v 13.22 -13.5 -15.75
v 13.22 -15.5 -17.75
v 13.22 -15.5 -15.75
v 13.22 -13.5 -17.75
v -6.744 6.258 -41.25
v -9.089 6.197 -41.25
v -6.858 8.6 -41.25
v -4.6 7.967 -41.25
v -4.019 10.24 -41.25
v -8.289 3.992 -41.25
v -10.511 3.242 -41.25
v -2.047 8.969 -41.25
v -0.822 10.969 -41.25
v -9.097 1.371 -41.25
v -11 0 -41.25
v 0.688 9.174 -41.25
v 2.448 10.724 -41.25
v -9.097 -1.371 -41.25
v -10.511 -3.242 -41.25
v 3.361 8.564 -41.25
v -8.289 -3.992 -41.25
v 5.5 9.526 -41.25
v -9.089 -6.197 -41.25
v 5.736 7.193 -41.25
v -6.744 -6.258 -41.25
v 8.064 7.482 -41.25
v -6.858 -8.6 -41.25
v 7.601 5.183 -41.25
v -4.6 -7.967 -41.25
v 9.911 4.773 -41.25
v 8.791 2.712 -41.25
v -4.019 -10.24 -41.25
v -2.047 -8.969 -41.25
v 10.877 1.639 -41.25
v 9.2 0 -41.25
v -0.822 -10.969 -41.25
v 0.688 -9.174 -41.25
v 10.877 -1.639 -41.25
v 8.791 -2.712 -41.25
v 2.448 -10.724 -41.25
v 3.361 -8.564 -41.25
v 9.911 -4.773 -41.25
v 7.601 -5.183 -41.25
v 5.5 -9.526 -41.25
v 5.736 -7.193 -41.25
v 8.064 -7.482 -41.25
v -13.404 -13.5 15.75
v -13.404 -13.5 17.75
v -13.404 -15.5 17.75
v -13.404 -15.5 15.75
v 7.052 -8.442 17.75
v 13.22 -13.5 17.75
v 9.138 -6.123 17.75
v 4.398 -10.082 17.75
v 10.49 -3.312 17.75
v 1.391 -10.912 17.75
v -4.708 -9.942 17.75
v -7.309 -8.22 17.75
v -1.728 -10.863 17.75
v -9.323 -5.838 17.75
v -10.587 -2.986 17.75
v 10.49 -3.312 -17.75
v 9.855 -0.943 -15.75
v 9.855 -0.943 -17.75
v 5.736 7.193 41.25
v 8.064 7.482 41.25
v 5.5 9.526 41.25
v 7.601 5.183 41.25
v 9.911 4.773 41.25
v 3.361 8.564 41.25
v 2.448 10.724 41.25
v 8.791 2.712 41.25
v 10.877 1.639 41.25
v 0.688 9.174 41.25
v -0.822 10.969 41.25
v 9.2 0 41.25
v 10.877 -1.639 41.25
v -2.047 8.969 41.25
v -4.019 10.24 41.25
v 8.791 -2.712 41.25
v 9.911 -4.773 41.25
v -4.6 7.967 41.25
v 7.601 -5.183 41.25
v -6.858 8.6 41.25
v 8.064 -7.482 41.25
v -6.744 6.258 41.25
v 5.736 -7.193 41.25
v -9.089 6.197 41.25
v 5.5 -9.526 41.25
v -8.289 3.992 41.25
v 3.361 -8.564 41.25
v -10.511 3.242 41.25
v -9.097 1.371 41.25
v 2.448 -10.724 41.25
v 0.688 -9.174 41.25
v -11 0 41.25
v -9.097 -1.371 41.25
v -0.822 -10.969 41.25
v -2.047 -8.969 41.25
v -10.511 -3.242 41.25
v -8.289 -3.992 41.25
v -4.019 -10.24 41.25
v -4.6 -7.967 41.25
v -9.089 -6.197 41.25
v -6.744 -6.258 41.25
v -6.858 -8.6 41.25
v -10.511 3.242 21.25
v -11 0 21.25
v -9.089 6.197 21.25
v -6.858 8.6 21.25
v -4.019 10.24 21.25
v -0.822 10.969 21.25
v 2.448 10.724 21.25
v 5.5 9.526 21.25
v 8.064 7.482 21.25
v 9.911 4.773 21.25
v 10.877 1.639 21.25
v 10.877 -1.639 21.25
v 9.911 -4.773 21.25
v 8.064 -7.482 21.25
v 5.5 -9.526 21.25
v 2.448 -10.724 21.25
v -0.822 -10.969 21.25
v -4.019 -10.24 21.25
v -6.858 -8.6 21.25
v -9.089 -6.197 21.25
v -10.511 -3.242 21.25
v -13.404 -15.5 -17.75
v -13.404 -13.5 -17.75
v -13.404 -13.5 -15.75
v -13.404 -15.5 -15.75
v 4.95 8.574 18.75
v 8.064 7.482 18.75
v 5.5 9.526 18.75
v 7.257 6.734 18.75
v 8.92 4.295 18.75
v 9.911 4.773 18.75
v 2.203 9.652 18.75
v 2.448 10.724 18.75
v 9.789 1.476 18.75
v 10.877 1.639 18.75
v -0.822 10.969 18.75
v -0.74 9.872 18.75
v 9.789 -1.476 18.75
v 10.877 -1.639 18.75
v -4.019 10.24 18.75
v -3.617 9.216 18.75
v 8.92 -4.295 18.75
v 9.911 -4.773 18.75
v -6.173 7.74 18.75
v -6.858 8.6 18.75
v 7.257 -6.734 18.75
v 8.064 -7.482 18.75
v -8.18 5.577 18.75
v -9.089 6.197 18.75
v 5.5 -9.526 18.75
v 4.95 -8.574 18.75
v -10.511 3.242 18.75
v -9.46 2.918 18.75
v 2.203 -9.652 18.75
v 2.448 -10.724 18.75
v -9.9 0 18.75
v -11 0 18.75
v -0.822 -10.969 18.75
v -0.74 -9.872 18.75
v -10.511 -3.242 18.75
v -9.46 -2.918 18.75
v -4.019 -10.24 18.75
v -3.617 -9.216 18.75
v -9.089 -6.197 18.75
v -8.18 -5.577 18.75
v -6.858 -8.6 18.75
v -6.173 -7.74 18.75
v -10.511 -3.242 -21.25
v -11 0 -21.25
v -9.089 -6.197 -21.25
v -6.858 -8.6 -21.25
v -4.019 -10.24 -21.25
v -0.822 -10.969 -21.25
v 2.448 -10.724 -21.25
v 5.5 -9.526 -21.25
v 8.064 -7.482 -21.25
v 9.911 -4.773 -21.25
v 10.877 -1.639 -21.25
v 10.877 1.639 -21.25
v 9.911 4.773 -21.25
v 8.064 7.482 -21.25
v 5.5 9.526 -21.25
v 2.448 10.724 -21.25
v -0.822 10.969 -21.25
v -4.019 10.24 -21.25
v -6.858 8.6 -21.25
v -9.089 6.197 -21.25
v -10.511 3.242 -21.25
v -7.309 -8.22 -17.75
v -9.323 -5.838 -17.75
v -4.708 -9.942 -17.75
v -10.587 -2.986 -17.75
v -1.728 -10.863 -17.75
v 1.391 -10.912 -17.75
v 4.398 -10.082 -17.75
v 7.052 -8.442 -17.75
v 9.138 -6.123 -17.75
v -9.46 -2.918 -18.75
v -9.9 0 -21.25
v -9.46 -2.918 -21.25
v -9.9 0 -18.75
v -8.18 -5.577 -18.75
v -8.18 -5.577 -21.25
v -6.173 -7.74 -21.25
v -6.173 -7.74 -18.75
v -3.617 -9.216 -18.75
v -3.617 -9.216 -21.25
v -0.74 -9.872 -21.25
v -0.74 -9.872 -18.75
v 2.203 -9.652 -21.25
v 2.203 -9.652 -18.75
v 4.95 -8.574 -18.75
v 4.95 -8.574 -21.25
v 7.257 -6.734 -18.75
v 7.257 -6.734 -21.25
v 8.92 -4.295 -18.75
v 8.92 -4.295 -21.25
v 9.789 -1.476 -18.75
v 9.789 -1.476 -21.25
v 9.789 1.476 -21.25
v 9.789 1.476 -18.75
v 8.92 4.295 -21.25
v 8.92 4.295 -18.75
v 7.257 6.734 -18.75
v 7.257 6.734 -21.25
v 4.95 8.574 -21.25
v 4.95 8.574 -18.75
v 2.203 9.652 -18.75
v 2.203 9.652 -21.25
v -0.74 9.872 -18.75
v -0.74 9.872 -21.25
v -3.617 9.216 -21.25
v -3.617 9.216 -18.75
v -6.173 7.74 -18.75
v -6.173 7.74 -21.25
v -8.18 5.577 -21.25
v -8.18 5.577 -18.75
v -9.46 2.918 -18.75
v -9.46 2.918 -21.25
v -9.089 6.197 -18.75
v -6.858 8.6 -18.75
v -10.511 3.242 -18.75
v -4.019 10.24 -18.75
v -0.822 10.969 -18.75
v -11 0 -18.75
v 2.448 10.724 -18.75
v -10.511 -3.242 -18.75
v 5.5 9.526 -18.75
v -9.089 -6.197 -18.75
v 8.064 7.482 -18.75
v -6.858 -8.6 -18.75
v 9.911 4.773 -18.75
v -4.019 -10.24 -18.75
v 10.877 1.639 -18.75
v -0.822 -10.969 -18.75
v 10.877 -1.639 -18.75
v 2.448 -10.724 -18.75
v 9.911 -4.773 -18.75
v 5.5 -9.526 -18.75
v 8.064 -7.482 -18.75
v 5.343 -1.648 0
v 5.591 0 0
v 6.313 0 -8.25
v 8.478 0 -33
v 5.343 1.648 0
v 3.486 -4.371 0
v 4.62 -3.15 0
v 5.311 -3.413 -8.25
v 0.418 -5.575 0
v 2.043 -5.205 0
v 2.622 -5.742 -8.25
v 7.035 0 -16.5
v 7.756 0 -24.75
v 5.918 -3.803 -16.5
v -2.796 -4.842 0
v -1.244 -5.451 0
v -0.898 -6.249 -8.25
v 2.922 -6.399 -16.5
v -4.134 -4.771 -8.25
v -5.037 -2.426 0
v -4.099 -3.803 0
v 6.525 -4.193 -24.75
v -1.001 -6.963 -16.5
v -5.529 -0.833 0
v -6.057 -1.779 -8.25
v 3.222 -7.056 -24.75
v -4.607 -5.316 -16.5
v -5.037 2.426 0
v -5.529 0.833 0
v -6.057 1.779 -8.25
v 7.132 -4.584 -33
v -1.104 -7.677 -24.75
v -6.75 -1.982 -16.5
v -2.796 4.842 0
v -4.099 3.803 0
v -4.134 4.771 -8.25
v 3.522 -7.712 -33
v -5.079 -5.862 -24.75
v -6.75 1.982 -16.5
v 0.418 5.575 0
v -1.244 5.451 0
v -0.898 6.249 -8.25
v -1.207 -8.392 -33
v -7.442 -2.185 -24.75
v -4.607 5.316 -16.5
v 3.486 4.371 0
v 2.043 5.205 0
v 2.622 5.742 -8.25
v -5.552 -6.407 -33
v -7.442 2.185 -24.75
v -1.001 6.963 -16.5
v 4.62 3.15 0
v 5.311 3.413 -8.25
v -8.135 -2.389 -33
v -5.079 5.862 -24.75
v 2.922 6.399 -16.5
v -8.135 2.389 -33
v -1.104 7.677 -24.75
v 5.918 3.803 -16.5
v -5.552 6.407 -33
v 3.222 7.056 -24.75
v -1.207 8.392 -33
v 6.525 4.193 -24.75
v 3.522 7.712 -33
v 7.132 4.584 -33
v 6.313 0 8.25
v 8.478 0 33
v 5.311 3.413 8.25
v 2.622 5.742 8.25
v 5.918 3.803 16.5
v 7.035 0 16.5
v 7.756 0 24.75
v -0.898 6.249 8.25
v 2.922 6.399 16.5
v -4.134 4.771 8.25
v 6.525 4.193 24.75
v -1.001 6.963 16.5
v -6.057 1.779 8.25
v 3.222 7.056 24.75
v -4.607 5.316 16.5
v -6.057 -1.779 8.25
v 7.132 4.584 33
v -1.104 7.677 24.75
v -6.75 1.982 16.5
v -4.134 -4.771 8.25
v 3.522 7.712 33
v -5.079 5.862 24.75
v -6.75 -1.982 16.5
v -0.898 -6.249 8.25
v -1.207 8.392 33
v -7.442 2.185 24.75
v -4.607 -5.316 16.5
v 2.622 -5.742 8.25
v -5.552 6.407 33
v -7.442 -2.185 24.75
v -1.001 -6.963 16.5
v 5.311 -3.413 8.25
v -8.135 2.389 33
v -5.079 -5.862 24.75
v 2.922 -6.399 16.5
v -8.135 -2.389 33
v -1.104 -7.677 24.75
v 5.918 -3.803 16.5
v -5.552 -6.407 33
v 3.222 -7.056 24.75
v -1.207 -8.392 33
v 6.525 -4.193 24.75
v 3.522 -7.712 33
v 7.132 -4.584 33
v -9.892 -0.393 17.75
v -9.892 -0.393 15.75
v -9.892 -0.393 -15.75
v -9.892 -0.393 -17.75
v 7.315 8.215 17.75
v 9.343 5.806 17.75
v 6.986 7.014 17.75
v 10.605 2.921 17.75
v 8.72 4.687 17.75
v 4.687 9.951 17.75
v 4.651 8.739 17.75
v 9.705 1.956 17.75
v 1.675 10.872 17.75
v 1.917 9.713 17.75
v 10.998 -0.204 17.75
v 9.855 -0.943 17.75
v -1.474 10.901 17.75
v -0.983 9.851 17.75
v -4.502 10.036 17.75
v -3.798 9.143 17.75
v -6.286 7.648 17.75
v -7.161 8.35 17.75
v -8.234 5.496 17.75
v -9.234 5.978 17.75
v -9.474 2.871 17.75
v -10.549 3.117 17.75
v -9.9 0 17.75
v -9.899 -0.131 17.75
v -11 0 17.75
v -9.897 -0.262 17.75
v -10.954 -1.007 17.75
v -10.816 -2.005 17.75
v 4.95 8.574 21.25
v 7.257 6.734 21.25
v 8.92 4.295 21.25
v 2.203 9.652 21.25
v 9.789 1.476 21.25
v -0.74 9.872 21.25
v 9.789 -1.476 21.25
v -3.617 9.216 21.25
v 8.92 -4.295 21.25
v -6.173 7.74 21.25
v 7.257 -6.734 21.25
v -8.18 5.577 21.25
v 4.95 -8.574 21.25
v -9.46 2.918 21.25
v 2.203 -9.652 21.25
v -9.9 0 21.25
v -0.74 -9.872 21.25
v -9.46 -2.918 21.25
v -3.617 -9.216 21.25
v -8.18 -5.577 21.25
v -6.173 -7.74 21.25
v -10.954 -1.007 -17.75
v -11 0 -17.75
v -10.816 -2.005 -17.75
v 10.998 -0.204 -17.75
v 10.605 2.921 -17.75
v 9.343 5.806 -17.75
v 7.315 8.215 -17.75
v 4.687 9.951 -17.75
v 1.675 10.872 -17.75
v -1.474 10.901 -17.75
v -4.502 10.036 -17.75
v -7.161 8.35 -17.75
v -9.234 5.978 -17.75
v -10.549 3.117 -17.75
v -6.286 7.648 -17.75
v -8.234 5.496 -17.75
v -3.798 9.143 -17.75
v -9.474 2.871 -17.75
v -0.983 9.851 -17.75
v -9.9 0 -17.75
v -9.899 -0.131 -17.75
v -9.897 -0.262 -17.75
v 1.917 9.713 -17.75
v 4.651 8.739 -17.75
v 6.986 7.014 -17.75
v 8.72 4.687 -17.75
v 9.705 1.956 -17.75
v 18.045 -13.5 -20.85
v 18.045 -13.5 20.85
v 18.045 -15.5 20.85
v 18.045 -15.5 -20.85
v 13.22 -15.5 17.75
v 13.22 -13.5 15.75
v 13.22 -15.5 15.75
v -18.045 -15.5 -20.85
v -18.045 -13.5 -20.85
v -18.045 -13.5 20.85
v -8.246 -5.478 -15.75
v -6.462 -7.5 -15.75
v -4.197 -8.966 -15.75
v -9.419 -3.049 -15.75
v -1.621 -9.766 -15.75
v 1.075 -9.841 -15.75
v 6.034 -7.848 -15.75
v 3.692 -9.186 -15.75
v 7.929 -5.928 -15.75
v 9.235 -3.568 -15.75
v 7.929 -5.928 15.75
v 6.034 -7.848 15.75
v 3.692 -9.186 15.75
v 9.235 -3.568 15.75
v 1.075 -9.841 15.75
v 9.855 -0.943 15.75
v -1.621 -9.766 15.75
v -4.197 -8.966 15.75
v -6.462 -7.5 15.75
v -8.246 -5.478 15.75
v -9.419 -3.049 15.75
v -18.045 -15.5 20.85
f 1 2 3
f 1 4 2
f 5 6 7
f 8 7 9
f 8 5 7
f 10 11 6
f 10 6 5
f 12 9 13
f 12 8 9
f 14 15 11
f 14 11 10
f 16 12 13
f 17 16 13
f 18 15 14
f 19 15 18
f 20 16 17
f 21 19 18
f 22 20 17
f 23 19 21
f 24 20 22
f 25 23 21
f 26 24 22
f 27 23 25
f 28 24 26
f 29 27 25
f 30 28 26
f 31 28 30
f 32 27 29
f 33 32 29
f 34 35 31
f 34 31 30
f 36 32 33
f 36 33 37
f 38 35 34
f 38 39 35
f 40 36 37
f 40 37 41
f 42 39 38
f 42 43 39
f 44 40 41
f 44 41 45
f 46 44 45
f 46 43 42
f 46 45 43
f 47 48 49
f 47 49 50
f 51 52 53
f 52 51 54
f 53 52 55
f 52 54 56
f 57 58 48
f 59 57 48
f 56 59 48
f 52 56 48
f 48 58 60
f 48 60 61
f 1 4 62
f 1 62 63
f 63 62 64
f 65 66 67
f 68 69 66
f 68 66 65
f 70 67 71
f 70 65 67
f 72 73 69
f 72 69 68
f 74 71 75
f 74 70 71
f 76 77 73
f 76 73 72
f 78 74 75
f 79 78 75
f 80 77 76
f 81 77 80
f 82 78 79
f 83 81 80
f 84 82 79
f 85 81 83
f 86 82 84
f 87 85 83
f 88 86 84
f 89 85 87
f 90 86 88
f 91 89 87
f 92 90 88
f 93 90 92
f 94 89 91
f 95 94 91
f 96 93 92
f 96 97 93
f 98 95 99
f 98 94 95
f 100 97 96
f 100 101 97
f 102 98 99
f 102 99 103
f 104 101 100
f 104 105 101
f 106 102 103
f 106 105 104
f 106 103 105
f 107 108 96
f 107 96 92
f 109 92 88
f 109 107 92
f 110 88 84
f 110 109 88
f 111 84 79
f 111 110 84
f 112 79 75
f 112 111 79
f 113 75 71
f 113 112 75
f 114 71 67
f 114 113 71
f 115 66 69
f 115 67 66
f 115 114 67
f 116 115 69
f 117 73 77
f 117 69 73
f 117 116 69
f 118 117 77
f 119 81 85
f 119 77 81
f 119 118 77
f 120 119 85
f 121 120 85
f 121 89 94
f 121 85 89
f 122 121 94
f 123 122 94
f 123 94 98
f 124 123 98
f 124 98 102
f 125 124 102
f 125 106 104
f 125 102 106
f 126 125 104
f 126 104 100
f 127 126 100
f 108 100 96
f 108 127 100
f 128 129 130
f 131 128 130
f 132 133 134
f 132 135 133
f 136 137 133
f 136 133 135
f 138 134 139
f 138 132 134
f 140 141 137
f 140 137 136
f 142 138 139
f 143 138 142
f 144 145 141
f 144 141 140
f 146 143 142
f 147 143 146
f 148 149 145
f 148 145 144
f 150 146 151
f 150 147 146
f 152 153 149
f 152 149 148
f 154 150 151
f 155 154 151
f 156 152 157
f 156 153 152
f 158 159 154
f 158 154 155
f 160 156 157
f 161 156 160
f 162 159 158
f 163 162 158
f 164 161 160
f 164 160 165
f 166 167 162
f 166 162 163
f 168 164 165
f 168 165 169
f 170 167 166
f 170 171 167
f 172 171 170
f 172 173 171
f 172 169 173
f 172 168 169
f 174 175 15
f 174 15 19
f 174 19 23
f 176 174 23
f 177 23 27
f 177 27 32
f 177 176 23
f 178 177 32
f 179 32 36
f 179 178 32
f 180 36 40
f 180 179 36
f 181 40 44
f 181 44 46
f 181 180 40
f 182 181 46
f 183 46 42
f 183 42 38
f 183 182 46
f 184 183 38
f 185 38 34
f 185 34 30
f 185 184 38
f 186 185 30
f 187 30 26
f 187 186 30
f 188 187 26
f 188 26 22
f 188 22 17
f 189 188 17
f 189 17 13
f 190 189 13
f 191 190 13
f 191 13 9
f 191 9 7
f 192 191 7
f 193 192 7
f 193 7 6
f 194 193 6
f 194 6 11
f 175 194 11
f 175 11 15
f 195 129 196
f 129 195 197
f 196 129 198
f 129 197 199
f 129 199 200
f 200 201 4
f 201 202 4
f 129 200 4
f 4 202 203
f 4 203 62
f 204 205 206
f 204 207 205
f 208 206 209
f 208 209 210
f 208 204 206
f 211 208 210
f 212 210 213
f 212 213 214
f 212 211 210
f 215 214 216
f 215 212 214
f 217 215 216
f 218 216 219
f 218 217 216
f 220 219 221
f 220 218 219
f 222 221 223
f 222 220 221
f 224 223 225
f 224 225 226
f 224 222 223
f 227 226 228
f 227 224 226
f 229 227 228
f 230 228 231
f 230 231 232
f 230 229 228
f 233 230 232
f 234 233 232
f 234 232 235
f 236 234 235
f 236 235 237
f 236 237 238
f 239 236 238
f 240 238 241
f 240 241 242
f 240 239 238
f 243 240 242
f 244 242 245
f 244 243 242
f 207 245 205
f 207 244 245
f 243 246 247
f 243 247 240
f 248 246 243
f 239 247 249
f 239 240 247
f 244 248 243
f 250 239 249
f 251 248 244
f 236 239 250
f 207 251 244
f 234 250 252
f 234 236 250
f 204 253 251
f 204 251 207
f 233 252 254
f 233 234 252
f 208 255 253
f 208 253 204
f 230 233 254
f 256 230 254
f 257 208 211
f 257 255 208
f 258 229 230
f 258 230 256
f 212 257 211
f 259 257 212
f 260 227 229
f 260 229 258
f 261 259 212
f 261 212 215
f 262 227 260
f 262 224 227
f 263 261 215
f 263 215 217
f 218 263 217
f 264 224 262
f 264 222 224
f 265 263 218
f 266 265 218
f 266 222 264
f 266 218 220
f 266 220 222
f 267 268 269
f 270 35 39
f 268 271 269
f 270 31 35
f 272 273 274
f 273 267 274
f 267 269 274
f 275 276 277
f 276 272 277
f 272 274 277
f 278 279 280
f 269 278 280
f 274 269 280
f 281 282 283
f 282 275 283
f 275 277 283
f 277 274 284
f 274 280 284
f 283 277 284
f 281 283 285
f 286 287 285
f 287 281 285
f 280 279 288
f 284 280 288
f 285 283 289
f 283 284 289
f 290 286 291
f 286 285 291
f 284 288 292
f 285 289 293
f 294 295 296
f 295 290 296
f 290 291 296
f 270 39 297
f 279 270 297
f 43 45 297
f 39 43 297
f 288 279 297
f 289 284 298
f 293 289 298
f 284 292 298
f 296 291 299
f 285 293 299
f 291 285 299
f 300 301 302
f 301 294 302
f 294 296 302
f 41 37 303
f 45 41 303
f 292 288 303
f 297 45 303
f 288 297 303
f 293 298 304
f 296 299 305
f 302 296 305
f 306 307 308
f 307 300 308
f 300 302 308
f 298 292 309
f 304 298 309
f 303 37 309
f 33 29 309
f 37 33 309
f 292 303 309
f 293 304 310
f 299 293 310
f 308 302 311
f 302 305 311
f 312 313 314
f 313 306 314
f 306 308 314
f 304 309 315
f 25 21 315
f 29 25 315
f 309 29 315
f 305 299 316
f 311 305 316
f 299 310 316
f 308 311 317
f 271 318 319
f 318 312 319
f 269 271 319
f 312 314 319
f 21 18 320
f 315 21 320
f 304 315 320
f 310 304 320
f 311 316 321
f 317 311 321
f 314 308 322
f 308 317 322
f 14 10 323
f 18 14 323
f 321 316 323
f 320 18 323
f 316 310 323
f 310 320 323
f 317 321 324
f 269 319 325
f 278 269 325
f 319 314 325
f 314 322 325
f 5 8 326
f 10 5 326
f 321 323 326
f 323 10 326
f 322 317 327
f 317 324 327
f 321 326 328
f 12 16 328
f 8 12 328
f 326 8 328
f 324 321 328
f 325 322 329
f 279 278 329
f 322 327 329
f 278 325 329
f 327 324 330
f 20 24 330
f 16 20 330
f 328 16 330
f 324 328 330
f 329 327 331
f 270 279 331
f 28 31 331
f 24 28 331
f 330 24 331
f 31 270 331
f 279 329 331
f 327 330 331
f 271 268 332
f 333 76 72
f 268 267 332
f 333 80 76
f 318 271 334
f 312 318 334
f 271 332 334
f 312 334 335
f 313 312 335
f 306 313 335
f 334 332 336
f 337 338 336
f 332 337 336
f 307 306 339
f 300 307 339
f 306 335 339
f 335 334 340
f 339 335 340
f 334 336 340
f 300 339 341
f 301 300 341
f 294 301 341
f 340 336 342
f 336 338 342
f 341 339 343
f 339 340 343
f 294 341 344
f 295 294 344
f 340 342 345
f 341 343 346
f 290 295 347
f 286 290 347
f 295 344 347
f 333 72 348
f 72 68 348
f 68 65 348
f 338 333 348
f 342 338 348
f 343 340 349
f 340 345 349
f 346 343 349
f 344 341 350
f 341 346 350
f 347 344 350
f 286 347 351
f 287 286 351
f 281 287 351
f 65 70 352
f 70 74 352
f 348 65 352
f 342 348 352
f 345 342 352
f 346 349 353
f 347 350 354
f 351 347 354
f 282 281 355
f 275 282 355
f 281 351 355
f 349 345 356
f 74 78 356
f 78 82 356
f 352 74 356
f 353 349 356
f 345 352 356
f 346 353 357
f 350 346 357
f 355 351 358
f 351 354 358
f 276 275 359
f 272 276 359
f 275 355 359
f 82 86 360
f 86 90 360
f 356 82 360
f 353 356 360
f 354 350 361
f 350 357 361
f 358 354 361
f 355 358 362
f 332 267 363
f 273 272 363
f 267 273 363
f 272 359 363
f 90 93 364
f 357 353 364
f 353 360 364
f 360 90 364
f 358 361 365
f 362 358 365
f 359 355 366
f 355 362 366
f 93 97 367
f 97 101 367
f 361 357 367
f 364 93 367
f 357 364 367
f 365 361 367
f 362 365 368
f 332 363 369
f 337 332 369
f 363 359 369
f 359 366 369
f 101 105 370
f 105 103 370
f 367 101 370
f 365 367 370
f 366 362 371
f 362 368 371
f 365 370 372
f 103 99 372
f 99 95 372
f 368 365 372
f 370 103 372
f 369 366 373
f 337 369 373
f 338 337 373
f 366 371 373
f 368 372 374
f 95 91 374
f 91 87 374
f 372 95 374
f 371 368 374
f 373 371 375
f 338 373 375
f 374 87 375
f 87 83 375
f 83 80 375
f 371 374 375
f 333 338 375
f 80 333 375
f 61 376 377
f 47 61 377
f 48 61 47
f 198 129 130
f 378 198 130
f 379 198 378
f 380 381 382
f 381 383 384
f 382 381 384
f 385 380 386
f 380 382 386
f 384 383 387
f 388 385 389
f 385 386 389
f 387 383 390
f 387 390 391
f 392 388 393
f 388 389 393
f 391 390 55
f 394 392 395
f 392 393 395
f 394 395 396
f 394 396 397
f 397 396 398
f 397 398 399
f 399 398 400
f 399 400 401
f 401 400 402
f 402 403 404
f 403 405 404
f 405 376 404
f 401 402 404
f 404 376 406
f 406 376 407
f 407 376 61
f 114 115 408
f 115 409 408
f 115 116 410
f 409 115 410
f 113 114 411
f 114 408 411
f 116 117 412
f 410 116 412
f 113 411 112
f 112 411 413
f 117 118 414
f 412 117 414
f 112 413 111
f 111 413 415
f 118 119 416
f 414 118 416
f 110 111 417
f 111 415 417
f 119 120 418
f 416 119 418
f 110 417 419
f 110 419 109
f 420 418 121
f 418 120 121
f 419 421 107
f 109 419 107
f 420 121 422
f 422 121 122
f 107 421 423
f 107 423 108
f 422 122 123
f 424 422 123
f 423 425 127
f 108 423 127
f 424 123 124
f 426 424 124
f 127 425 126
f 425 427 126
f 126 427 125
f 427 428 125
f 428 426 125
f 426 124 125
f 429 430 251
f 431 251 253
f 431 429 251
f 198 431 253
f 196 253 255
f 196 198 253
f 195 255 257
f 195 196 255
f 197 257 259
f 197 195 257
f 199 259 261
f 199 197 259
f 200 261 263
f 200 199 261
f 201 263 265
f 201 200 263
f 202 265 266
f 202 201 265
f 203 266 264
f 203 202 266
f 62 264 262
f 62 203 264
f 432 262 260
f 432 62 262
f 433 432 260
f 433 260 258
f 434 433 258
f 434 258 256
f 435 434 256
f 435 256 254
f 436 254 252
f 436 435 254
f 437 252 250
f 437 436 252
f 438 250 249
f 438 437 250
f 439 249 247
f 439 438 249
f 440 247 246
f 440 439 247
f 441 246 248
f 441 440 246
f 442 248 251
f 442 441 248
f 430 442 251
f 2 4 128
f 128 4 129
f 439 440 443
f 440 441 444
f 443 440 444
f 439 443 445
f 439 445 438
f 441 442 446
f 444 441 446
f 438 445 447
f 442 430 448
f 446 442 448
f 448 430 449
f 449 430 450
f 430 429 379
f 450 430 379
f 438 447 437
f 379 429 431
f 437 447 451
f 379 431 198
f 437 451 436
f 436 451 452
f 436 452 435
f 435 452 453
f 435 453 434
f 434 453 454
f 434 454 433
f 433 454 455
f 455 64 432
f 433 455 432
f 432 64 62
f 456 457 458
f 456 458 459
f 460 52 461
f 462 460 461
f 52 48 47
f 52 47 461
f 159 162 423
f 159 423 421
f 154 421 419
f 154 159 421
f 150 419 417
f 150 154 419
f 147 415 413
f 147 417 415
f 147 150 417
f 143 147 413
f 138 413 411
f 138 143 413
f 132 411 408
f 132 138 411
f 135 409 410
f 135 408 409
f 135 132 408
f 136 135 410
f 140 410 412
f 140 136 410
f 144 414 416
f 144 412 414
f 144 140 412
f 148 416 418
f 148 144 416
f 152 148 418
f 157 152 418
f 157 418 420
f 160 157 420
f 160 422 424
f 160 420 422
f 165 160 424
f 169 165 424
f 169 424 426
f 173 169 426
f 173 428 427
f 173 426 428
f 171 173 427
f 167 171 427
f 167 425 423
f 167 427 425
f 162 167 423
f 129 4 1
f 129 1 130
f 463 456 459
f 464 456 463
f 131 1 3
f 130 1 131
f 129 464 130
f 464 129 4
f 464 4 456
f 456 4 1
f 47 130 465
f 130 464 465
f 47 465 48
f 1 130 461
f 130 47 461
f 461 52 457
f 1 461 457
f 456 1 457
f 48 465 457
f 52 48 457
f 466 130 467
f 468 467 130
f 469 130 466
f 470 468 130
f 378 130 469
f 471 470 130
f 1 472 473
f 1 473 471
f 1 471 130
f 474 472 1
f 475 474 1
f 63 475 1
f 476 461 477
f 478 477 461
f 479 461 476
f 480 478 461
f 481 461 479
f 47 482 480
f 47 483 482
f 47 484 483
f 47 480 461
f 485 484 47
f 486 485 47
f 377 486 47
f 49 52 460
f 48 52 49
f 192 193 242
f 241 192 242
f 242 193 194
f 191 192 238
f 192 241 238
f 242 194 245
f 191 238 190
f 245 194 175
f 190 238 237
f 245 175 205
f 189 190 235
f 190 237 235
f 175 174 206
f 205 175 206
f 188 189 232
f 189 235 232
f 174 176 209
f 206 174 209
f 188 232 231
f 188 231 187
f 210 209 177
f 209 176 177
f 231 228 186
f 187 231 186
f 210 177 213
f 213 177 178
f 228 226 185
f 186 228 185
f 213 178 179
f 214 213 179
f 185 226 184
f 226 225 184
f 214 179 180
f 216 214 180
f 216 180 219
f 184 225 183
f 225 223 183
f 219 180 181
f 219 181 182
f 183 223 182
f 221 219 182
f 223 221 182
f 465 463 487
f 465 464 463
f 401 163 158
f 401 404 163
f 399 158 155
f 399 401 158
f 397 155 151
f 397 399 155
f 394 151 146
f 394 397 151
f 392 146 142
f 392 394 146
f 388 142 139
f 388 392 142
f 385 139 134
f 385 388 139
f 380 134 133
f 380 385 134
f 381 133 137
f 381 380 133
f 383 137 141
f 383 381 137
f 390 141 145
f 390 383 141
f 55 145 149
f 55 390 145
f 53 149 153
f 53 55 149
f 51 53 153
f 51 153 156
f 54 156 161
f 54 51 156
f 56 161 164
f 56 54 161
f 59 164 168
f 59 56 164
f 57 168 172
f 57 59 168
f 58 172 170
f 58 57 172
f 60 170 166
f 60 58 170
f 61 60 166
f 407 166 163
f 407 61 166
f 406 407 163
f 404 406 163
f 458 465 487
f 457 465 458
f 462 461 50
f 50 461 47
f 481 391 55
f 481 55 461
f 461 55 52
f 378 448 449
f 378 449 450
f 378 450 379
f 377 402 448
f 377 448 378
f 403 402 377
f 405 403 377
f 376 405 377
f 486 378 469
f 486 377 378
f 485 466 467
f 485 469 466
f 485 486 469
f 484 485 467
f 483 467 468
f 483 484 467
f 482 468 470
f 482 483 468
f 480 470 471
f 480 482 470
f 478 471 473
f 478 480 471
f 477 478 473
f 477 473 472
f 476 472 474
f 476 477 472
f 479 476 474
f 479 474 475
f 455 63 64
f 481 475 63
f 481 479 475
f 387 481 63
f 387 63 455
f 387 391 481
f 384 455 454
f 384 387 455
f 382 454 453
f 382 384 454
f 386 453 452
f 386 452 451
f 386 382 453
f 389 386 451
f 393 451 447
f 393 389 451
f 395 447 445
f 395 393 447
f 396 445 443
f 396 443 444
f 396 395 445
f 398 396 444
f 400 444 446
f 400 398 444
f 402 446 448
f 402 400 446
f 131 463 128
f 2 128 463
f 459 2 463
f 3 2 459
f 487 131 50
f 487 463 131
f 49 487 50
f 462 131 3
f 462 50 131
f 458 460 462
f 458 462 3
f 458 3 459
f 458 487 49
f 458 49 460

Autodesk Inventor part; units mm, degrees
ref_plane "YZ Plane" through (0, 0, 0) normal (1, 0, 0) x (0, 1, 0)
ref_plane "XZ Plane" through (0, 0, 0) normal (0, 1, 0) x (-1, 0, 0)
ref_plane "XY Plane" through (0, 0, 0) normal (0, 0, 1) x (1, 0, 0)
sketch "Sketch1" plane through (0, 0, 0) normal (0, 1, 0) x (-1, 0, 0)
  line L0 (0, 0) -> (0, 21.25)
  line L1 (0, 21.25) -> (0, 41.25)
  line L2 (0, 41.25) -> (11, 41.25)
  line L3 (11, 41.25) -> (11, 21.25)
  line L4 (11, 21.25) -> (9.9, 21.25)
  line L5 (9.9, 21.25) -> (9.9, 18.75)
  line L6 (9.9, 18.75) -> (11, 18.75)
  line L7 (11, 18.75) -> (11, 17.75)
  line L8 (11, 17.75) -> (9.9, 17.75)
  line L9 (9.9, 17.75) -> (9.9, 0)
  line L10 (9.9, 0) -> (0, 0)
  dimension "d1" = 20
  dimension "d2" = 11
  dimension "d3" = 20
  dimension "d4" = 9.9
  dimension "d6" = 2.5
  dimension "d7" = 1
  dimension "d8" = 0
  dimension "d19" = 17.75
revolve "Revolution1" add sketch "Sketch1" angle 360 about axis through (0, 0, 21.25) along (0, 0, 1)
sketch "Sketch2" plane through (0, 0, 41.25) normal (0, 0, 1) x (1, 0, 0)
  circle A0 centre (0, 0) radius 11 projected
  circle A1 centre (0, 0) radius 9.2
  point P0 (0, 0)
  dimension "d20" = 1.8
extrude "Extrusion1" cut sketch "Sketch2" against normal through all draft -5 contours A1
mirror "Mirror1" about plane through (0, 0, 0) normal (0, 0, -1) of "Revolution1", "Extrusion1"
ref_plane "Work Plane1" through (0, 0, 0) normal (0, 0, -1) x (-1, 0, 0)
sketch "Sketch3" plane through (0, 0, 17.75) normal (0, 0, -1) x (-1, 0, 0)
  circle A0 centre (0, 0) radius 5.5911 projected
  circle A1 centre (0, 0) radius 9.2 projected
  circle A2 centre (0, 0) radius 9.9 projected
  line L0 (-9.855, -0.943) -> (-13.2196, -13.5)
  line L1 (-9.855, -0.943) -> (3.145, -0.943) construction
  line L2 (9.8922, -0.393) -> (13.4042, -13.5)
  line L3 (9.8922, -0.393) -> (23.4616, -0.393) construction
  line L4 (13.4042, -13.5) -> (-13.2196, -13.5)
  point P0 (0, 0)
  dimension "d12" = 13
  dimension "d13" = 105
  dimension "d14" = 75
  dimension "d21" = 13.5
extrude "Extrusion2" add sketch "Sketch3" along normal blind 2 contours A2 L2 L4 L0
mirror "Mirror2" about plane through (0, 0, 0) normal (0, 0, -1) of "Extrusion2"
sketch "Sketch4" plane through (-13.4042, -13.5, -17.75) normal (0, -1, 0) x (1, 0, 0)
  line L0 (26.6239, 0) -> (0, 0) projected
  line L1 (26.6239, 0) -> (26.6239, 2) projected
  line L2 (26.6239, 2) -> (0, 2) projected
  line L3 (0, 0) -> (0, 2) projected
  line L4 (26.6239, 35.5) -> (0, 35.5) projected
  line L5 (0, 35.5) -> (0, 33.5) projected
  line L6 (26.6239, 33.5) -> (0, 33.5) projected
  line L7 (26.6239, 35.5) -> (26.6239, 33.5) projected
  line L8 (31.4495, -3.0996) -> (-4.641, -3.0996)
  line L9 (-4.641, -3.0996) -> (-4.641, 38.5996)
  line L10 (-4.641, 38.5996) -> (31.4495, 38.5996)
  line L11 (31.4495, 38.5996) -> (31.4495, -3.0996)
  line L12 (31.4495, -3.0996) -> (-4.641, 38.5996) construction
  line L13 (-4.641, -3.0996) -> (31.4495, 38.5996) construction
  point P0 (13.4042, 17.75)
extrude "Extrusion3" add sketch "Sketch4" along normal blind 2
properties part number "00_Sensirion_Flowsensor"
